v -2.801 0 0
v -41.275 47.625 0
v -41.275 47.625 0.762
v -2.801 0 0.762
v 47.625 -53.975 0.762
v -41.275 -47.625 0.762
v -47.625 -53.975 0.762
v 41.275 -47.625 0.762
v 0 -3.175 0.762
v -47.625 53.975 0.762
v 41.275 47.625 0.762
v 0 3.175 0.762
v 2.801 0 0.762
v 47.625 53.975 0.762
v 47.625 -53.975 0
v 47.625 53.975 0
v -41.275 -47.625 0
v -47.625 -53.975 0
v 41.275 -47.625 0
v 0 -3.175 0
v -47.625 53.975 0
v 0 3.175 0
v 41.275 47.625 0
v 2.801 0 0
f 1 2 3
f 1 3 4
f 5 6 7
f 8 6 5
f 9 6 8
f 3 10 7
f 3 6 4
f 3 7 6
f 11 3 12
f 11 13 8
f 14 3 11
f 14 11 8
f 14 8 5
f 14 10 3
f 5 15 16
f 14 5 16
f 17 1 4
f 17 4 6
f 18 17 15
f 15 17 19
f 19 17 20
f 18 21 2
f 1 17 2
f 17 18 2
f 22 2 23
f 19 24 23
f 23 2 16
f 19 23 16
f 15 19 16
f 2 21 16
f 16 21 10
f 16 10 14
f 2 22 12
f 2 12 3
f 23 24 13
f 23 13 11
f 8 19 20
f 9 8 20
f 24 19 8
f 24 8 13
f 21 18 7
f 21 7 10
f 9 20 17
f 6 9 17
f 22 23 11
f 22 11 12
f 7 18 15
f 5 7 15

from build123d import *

# Parameters (mm, degrees)
SKETCH1_W           = 95.25
SKETCH1_H           = 107.95
SKETCH1_W_2         = 82.55
SKETCH1_H_2         = 95.25
BOSS_EXTRUDE1_DEPTH = 0.762


with BuildPart() as part:
    # Sketch1 → Boss-Extrude1 (new body)
    # profile 1 of 5: a face of its own
    with BuildSketch(Plane.XY):
        Rectangle(SKETCH1_W, SKETCH1_H)
        Rectangle(SKETCH1_W_2, SKETCH1_H_2, mode=Mode.SUBTRACT)
    # profile 2 of 5: a face of its own
    with BuildSketch(Plane.XY):
        Polygon((-2.801470588, 0), (-41.275, -47.625), (-41.275, 47.625), align=None)
    # profile 3 of 5: a face of its own
    with BuildSketch(Plane.XY):
        Polygon((0, 3.175), (-41.275, 47.625), (41.275, 47.625), align=None)
    # profile 4 of 5: a face of its own
    with BuildSketch(Plane.XY):
        Polygon((2.801470588, 0), (41.275, 47.625), (41.275, -47.625), align=None)
    # profile 5 of 5: a face of its own
    with BuildSketch(Plane.XY):
        Polygon((41.275, -47.625), (0, -3.175), (-41.275, -47.625), align=None)
    extrude(amount=BOSS_EXTRUDE1_DEPTH)


solid = part.part
